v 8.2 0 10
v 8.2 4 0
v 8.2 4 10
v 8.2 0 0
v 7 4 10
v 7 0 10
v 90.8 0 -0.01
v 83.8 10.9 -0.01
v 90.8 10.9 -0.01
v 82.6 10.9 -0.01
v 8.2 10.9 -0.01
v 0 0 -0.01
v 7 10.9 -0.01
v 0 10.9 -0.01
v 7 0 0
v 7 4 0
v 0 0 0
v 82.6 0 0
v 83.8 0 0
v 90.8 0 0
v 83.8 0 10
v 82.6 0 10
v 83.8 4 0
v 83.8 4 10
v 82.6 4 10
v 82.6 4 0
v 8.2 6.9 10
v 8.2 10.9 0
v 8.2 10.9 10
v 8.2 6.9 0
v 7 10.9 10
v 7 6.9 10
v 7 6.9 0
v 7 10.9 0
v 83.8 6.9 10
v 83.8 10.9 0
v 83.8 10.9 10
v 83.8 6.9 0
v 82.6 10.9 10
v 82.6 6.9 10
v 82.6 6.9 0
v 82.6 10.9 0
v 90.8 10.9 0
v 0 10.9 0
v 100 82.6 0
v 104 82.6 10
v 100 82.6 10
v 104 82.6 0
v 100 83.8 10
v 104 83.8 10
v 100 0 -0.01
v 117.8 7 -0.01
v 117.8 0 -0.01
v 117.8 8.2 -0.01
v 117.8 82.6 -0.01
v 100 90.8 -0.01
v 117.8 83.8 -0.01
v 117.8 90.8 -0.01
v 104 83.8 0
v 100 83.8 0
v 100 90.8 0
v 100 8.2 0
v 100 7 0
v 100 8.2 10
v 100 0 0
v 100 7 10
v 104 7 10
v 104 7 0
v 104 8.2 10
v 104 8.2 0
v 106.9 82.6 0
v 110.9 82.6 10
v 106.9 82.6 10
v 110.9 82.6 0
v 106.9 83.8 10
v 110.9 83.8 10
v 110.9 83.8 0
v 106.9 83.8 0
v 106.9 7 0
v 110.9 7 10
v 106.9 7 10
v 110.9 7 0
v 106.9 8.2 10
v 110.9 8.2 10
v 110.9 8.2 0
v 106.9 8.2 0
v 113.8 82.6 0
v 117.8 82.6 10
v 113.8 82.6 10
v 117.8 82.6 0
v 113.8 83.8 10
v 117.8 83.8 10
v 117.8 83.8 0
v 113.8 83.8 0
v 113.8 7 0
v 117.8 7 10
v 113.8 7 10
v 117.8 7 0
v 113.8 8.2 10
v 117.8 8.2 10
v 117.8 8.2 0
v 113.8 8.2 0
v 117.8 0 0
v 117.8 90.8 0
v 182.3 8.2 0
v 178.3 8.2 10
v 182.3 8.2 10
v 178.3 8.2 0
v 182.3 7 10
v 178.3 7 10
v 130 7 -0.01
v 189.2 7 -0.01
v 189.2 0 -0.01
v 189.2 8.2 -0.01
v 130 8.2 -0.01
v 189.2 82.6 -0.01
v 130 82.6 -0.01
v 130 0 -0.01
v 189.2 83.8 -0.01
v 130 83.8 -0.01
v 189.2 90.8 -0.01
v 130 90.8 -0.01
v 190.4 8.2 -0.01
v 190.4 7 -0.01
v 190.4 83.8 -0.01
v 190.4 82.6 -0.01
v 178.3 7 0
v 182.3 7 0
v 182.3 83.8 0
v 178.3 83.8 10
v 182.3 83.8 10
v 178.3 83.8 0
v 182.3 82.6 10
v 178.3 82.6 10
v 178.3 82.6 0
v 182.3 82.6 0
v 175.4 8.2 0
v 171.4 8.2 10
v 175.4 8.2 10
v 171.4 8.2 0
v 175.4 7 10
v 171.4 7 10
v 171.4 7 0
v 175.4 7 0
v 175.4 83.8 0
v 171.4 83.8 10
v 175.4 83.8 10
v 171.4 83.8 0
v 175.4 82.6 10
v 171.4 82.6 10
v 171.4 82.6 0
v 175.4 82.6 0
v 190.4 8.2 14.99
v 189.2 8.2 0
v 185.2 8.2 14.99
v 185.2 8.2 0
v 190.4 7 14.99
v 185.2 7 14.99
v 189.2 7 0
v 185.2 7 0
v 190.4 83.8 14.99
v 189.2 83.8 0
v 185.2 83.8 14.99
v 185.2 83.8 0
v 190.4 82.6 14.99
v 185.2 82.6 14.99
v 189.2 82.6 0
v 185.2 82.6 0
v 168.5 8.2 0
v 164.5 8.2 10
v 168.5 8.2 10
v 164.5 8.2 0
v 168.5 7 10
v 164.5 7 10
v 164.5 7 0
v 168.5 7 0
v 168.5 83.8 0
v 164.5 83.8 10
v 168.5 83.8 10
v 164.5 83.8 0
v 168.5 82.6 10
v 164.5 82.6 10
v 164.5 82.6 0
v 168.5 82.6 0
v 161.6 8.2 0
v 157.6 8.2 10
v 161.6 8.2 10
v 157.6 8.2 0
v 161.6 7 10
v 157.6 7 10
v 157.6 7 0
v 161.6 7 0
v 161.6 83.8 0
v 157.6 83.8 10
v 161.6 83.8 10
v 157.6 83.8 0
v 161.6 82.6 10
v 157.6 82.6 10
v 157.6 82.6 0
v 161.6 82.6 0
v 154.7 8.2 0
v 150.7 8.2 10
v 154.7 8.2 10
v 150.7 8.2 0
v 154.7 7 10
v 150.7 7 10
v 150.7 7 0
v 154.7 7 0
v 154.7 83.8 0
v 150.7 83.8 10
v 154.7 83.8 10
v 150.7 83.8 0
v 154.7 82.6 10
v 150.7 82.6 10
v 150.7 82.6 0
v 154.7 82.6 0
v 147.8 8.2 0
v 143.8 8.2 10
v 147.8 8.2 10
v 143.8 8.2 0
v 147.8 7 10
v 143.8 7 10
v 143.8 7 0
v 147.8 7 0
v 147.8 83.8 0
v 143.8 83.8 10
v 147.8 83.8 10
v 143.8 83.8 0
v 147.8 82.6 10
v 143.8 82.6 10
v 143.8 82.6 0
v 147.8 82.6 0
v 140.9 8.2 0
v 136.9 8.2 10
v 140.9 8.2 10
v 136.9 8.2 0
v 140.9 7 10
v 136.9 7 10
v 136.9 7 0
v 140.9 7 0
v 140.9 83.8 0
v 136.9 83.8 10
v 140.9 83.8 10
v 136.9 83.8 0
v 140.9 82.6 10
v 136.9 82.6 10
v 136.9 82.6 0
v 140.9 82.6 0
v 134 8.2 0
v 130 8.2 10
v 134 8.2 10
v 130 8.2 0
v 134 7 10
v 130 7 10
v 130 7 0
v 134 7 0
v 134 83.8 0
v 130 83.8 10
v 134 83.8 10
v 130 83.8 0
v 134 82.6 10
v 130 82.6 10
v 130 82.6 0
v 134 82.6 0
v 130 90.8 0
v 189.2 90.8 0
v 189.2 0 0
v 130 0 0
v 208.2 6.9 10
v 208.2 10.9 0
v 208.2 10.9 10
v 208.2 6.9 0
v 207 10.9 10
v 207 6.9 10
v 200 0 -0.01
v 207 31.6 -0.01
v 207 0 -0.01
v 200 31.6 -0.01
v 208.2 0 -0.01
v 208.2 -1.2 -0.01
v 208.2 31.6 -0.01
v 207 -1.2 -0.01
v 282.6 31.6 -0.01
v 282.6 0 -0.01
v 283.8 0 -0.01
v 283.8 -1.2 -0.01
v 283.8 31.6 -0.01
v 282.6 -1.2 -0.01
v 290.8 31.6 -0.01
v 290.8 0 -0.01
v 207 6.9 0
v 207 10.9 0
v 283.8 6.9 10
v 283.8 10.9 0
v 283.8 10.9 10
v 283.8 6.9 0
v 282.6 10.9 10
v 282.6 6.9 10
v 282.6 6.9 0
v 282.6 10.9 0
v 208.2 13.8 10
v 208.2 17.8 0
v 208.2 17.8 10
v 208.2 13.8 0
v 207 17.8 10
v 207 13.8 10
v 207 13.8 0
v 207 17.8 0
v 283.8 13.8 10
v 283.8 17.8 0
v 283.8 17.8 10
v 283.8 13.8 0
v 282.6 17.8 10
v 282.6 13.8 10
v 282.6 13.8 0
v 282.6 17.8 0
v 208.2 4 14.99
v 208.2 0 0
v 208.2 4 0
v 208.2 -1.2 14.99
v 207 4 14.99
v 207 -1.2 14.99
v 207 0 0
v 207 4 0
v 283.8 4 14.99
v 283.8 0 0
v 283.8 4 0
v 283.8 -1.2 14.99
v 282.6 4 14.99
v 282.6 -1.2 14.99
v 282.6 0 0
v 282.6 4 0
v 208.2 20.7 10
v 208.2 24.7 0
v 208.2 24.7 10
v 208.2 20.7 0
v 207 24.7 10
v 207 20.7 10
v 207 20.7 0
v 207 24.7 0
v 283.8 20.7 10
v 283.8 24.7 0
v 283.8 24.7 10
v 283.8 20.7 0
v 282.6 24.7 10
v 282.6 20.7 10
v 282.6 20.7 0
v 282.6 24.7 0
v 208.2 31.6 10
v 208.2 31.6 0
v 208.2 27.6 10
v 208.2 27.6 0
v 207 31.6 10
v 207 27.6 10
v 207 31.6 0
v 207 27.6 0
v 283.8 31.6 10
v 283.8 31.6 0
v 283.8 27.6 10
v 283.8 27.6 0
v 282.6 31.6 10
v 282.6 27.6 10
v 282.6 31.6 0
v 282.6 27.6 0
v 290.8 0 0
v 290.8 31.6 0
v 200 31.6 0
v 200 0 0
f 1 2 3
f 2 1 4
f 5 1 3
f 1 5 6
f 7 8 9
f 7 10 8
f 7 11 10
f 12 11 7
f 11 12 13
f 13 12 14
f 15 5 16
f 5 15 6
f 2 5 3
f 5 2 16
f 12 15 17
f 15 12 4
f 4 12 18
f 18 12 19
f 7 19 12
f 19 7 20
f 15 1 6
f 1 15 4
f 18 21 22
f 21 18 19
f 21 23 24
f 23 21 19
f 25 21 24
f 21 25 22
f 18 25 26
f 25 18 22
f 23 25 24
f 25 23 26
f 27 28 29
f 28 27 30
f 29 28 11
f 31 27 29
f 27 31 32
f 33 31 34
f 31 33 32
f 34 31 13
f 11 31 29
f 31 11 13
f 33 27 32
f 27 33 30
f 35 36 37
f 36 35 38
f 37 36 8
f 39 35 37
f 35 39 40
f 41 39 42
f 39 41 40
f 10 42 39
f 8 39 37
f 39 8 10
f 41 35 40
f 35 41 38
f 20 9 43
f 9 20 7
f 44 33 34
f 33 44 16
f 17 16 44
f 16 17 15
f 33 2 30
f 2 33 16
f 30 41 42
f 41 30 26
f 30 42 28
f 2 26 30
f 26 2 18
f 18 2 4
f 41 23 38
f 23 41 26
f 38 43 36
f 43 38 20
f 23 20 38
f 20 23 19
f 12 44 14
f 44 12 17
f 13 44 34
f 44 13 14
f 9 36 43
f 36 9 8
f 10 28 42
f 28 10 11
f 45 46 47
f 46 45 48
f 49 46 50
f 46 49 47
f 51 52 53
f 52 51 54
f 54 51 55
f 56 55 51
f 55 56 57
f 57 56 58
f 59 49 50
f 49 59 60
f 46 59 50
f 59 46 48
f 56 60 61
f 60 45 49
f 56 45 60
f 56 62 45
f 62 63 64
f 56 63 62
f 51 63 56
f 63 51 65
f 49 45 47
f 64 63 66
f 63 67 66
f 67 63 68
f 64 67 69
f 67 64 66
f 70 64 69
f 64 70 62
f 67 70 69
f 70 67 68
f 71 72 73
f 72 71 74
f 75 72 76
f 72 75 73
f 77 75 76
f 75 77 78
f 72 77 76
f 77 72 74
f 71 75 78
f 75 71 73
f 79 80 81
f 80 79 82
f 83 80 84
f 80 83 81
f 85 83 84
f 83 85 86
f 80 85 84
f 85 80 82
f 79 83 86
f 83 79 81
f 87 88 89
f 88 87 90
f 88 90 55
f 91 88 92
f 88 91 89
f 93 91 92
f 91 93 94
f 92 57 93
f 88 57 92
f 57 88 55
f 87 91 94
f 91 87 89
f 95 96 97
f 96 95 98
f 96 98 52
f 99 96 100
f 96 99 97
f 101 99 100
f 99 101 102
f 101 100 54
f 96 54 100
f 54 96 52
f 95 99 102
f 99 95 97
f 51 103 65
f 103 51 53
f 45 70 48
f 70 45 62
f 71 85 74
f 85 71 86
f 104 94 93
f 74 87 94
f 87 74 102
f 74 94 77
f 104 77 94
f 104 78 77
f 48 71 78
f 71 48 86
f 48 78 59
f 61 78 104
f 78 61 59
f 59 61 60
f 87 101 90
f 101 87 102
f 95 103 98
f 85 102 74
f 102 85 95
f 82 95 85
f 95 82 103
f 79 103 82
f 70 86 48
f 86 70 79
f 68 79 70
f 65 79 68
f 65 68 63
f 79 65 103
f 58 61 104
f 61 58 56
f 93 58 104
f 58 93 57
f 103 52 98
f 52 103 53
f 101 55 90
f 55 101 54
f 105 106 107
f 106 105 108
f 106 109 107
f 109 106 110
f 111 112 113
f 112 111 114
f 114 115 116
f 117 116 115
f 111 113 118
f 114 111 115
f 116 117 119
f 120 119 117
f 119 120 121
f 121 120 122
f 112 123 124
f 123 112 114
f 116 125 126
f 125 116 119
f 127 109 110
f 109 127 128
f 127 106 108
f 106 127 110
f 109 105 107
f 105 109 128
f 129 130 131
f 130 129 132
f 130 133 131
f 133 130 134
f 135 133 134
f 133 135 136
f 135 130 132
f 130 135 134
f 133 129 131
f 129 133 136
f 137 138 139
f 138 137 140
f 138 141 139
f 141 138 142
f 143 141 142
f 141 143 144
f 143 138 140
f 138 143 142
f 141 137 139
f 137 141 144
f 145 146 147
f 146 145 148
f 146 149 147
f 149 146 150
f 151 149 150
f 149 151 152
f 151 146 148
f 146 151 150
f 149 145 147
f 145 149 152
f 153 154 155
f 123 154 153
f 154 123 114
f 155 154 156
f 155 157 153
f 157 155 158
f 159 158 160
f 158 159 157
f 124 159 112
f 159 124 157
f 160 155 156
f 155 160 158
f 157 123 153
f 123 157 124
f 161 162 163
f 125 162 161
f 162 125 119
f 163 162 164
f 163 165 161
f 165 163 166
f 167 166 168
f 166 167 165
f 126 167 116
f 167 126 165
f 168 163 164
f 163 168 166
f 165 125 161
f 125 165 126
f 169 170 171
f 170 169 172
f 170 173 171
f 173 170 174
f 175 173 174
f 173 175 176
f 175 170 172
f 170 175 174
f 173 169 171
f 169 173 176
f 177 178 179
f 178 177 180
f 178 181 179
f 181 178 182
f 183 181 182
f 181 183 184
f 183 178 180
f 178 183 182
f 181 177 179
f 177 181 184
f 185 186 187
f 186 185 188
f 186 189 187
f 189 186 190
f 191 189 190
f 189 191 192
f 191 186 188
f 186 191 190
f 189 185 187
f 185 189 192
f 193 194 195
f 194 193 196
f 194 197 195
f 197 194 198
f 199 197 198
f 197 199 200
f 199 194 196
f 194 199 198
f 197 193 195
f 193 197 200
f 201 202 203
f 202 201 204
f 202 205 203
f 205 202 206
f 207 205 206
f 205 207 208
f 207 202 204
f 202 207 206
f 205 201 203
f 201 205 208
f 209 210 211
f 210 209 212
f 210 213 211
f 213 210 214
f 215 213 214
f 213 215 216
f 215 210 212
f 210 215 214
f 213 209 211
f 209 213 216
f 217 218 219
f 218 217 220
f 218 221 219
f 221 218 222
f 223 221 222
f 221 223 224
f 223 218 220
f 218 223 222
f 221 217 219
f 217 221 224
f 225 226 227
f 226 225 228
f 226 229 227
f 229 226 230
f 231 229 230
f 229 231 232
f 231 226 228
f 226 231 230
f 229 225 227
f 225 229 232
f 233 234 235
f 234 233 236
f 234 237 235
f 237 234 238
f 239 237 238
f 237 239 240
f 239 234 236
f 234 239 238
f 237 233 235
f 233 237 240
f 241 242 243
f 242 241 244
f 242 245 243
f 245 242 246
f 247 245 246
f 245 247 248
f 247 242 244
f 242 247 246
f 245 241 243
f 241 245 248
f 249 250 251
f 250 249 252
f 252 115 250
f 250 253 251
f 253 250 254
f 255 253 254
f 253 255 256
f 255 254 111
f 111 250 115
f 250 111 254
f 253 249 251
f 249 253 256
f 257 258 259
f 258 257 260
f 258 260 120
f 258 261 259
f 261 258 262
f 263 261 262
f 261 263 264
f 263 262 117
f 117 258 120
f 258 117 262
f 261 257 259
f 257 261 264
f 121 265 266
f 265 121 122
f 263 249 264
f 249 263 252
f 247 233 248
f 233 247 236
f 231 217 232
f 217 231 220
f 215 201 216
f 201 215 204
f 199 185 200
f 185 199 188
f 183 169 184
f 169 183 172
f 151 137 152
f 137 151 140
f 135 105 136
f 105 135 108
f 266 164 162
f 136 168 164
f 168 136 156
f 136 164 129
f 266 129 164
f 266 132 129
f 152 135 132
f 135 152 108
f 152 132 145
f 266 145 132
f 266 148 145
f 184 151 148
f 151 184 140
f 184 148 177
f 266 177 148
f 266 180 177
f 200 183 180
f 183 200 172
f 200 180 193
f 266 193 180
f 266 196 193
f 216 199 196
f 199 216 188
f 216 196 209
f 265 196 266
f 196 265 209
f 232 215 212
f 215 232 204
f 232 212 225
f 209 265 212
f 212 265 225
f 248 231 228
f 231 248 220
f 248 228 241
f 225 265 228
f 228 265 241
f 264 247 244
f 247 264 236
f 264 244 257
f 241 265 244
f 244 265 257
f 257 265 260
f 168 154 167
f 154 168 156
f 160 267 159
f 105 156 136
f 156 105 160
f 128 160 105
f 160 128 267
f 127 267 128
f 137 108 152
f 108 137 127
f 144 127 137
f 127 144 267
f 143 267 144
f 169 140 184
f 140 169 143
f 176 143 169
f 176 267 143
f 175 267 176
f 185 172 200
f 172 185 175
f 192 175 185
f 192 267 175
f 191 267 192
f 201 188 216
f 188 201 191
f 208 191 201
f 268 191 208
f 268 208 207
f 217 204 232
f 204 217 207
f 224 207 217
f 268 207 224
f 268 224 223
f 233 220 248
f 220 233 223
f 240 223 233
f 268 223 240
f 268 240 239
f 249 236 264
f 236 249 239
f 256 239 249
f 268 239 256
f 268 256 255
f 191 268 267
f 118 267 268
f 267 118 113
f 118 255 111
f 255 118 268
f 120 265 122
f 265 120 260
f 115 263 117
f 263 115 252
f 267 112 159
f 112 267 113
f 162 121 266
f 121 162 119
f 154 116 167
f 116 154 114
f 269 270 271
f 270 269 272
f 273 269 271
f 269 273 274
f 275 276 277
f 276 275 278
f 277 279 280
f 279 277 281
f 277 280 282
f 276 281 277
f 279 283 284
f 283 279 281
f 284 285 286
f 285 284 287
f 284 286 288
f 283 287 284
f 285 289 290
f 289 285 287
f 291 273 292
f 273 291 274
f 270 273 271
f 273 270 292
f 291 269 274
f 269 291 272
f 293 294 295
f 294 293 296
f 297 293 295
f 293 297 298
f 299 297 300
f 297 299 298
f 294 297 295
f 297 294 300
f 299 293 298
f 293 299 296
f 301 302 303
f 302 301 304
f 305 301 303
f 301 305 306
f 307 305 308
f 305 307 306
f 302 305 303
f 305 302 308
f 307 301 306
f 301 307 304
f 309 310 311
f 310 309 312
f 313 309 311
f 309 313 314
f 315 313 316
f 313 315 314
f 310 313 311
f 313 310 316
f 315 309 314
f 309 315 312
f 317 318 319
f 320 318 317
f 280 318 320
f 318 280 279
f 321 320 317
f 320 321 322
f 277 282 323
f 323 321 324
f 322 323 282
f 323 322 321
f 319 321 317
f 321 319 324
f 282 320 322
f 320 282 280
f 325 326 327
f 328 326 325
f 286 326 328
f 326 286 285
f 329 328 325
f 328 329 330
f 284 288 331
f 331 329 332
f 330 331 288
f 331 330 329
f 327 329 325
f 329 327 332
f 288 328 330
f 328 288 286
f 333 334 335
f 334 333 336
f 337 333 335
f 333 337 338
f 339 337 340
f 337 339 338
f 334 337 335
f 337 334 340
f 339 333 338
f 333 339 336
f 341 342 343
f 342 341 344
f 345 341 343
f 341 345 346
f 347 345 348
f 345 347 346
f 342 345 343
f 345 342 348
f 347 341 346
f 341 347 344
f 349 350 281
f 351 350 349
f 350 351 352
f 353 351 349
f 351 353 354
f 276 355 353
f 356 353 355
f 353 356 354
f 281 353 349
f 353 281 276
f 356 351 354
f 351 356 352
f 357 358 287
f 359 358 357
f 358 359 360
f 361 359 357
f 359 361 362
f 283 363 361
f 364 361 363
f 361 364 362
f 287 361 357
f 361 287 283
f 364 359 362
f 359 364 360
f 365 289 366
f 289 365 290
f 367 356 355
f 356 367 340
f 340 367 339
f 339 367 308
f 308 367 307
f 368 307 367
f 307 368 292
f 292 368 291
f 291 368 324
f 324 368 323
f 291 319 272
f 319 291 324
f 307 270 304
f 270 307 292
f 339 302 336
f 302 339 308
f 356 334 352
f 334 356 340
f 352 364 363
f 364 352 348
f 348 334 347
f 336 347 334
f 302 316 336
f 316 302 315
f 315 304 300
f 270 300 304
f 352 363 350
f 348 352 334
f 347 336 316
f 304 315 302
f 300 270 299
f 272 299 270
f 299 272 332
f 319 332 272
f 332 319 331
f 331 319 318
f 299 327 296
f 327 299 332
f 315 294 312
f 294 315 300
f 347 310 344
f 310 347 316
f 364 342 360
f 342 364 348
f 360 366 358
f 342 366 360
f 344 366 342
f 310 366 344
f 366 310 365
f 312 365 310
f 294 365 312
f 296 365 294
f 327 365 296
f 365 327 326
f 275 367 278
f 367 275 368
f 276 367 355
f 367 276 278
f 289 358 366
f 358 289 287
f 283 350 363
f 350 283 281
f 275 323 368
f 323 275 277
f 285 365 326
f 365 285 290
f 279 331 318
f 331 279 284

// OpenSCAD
// file: ../../Base/Boxes.scad
// Fischertechnik Box Foundation
// Pre-designed Boxes

use <Constants.scad>

include <PlacementOptions.scad>

box190Width = 190;
box190Depth = 130;
box130Width = 130;
box130Depth = 95;

// Values are from an original ec3 box
topBottomDifference = 1.5;
outerHeight = 40;
innerHeight = 38.2;
baseThickness = outerHeight - innerHeight;
stackExcess = 5.7;
radius = 3.5;
wallThickness = 1.5;
tolerance = 0.2;
stackOffset = innerHeight - stackExcess;

boxUsageHeight = stackOffset;
boxWallThickness = wallThickness;
boxBaseThickness = baseThickness;
boxWebWidth = 3.0;

// getBoxWallThickness()
// Gets the wall thickness of a Fischertechnik Box
function getBoxWallThickness() = boxWallThickness;

// getBoxUsageHeight()
// Gets the usable height of a Fischertechnik box
function getBoxUsageHeight() = boxUsageHeight;

// getBoxInnerHeight()
// Gets the inner height of a Fischertechnik box, including the stack excess
function getBoxInnerHeight() = innerHeight;

// getBoxBaseThickness()
// Gets the thickness of the Fischertechnik box base.
function getBoxBaseThickness() = boxBaseThickness;

// getBoxWebWidth()
// Gets the width of a box web
function getBoxWebWidth() = boxWebWidth;

// getBox190Space()
// Gets the usable inner space of a Box 190 as an x/y-list
function getBox190Space() = [
    box190Width - 2*getBoxWallThickness() - topBottomDifference, 
    box190Depth - 2*getBoxWallThickness() - topBottomDifference ];

// BoxBase(width, depth)
// Creates an empty stackable Fischertechnik compatible box
// width = Outer width of the box (190, 130, ...)
// depth = Outer depth of the box (130, 95, ...)

module BoxBase(width, depth, height=outerHeight) {    
    thinPlate = 0.01;

    innerHeight = height - baseThickness;    
    
    module BodyPlate(width, depth) {
        translate([radius, radius])
        hull() {
            w = width-2*radius;
            d = depth-2*radius;
            cube([w, d, thinPlate]);
            cylinder(thinPlate, r=radius, $fn=getFragments());
            translate([w, 0])
                cylinder(thinPlate, r=radius, $fn=getFragments());
            translate([w, d])
                cylinder(thinPlate, r=radius, $fn=getFragments());
            translate([0, d])
                cylinder(thinPlate, r=radius, $fn=getFragments());
        }
    }
    
    module Body(tolerance=tolerance) {
        hull() {
            // Bottom with tolerance to fit into the original boxes when stacked
            translate([-wallThickness+tolerance, -wallThickness+tolerance, -baseThickness])
                BodyPlate(width-topBottomDifference-2*tolerance, depth-topBottomDifference-2*tolerance);
            
            // Top
            translate([-wallThickness-topBottomDifference/2, -wallThickness-topBottomDifference/2, innerHeight-thinPlate])
                BodyPlate(width, depth);
         }
    }

    module Cutoff() {
        hull() {
            coWidth = width - 2*wallThickness;
            coDepth = depth - 2*wallThickness;
            
            // Bottom
            BodyPlate(coWidth-topBottomDifference, coDepth-topBottomDifference);

            // Top
            translate([-topBottomDifference/2, -topBottomDifference/2, innerHeight+thinPlate]) 
                BodyPlate(coWidth, coDepth);
        }
    }
    
    difference() {        
        Body();
        Cutoff();
        stackOffset = innerHeight - stackExcess;
        translate([0, 0, stackOffset + baseThickness])
            Body(tolerance=0);
    }
}

// Creates the Fischertechnik empty box 130x190 mm and places it at position 0,0
// 190x130 are the outer sizes, the inner space is slightly smaller. Use getBox190Space() to get the inner sizes.
// The box is positioned that the usable inner space is at the 0,0,0 position. The

module Box190() {
    BoxBase(box190Width, box190Depth);
}

// Gets the usable inner space of a Box 130 as an x/y-list
function getBox130Space() = [
    box130Width - 2*getBoxWallThickness(), 
    box130Depth - 2*getBoxWallThickness() ];

// Creates the Fischertechnik empty box 95x130 mm and places it at position 0,0
// 190x130 are the outer sizes, the inner space is slightly smaller. Use getBox190Space() to get the inner sizes.
// The box is positioned that the usable inner space is at the 0,0,0 position. The

module Box130() {
    BoxBase(box130Width, box130Depth);
}

// Creates a web at the specified box walls
// corner 0 = LowerLeft, 1 = UpperLeft, 2 = UpperRight, 3 = LowerRight
// side 0 = LeftOfCorner, 1 = RightOfCorner
// distance = Distance in mm from the corner
// boxSpace = inner width and depth of the box (default: Box 190)
// webWidth = length of the web (default is 3 mms)
// webThickness = thickness of the web (default is 1 mm)

module BoxWeb(corner, side, distance, boxSpace=getBox190Space(), webWidth=getBoxWebWidth(), webThickness=1.0) {
    sink = getBoxWallThickness()/2;

    width = (corner % 2 == 0) ? 
            (side == LeftOfCorner ? webWidth : webThickness) :
            (side == LeftOfCorner ? webThickness : webWidth);

    depth = (corner % 2 == 0) ? 
            (side == RightOfCorner ? webWidth : webThickness) :
            (side == RightOfCorner ? webThickness : webWidth);
    
    xDiff = corner == LowerLeft ? 
                (side == LeftOfCorner ? -sink : distance) :
            (corner == UpperLeft ?                
                (side == LeftOfCorner ? distance : -sink) :
            (corner == UpperRight ?
                (side == LeftOfCorner ? boxSpace.x-webWidth+sink : boxSpace.x-distance-webThickness) :
                (side == LeftOfCorner ? boxSpace.x-distance-webThickness: boxSpace.x-webWidth+sink)));

    yDiff = corner == LowerLeft ? 
                (side == RightOfCorner ? -sink : distance) :
            (corner == UpperLeft ?
                (side == RightOfCorner ? boxSpace.y-distance : boxSpace.y-webWidth+sink) :
            (corner == UpperRight ?
                (side == RightOfCorner ? boxSpace.y-webWidth+sink : boxSpace.y-distance) :
                (side == RightOfCorner ? distance : -sink)));
    
    translate([xDiff, yDiff, -getExcess()])
        cube([width, depth, boxUsageHeight + 2*getExcess()]);
}
// file: ../../Base/Rotation.scad
// Fischertechnik Box Foundation
// Geometry Helpers Rotation

include <PlacementOptions.scad>

// getRotatedSpace(space, rotation=NoRotation)
// Rotates the space dependent on the specified rotation

function getRotatedSpace(space, rotation=NoRotation) = [
    (rotation == Rotate90 || rotation == Rotate270) ? space.y : space.x,
    (rotation == Rotate90 || rotation == Rotate270) ? space.x : space.y
];

// Rotates the given space around the fixed left lower corner
// space = the space the children needs as width/depth list [width,depth]
// rotation = 0 Rotate0 degrees, 1 Rotate90 degrees, 2 Rotate180 degrees, 3 Rotate270 degrees (equivalent to -90)

module RotateFix(space, rotation=NoRotation) {
    dy = (rotation == Rotate0 || rotation == Rotate270) ? 0 :
        (rotation == Rotate90) ? space.x :
        space.y;
    dx = (rotation < Rotate180) ? 0 :
        (rotation == Rotate180) ? space.x :
        space.y;
    
    translate([dx, dy, 0])
        rotate([0, 0, rotations[rotation]])
            children();
}
// file: ../../Base/Alignment.scad
// Fischertechnik Box Foundation
// Geometry Helpers Alignment

include <PlacementOptions.scad>

// getAlignedX(elementWidth, spaceWidth, align=AlignRight, offset=0)
// Gets the aligned X offset of an element with the given
// width in the given space.
// elementWidth = The width of the element to positon
// spaceWidth = The space where the element should be aligned
// align = 0 AlignLeft, 1 AlignCenter, 2 AlignRight
// offset = an optional offset from the aligned position. When
// aligned left or centered, then positive values are in X direction.
// When aligned right then positive values are in negative X direction.

function getAlignedX(elementWidth, spaceWidth, align=AlignRight, offset=0) =
    (align == AlignLeft) ?
        offset :
        ((align == AlignCenter) ?
        (spaceWidth - elementWidth)/2 + offset :
        spaceWidth - offset - elementWidth);

// getAlignedY(elementDepth, spaceDepth, align=AlignTop, offset=0)
// Gets the aligned Y offset of an element with the given
// depth in the given space.
// elementDepth = The depth of the element to positon
// spaceDepth = The space where the element should be aligned
// align = 0 AlignBottom, 1 AlignCenter, 2 AlignTop
// offset = an optional offset from the aligned position. When
// aligned bottom or centered, then positive values are in Y direction.
// When aligned top then positive values are in negative Y direction.

function getAlignedY(elementDepth, spaceDepth, align=AlignTop, offset=0) =
    (align == AlignBottom) ?
        offset :
        ((align == AlignCenter) ?
        (spaceDepth - elementDepth)/2 + offset :
        spaceDepth - offset - elementDepth);
// file: ../../Base/Constants.scad
// Fischertechnik Box Foundation
// Constants

// Constant values necessary for multiple elements

// Base constants
dividerThickness = 1.2;
excess = 0.01;
fragments = 90;
tolerance = 0.8;

// Gets the thickness of a divider 
function getDividerThickness() = dividerThickness;

// Gets the excess that is used to merge walls into each other
function getExcess() = excess;

// Gets amount of fragments of a cylinder
function getFragments() = fragments;

// Gets the inner tolerance of a frame to each side
function getTolerance() = tolerance;


// Fischertechnik specific constants
axisDiameter = 4;
axisBottomDiameter = axisDiameter + 1;
standardEdgeDistance = 2.5;
standardWebDistance = 11.5;
standardCornerLength = 15;
tubeWallFactor = 0.8;
smallPartsFrameHeight = 20;

// Gets axis diameter
function getAxisDiameter() = axisDiameter;

// Gets axis bottom diameter for thicker part at the bottom
function getAxisBottomDiameter() = axisBottomDiameter;

// gets the standard distance to the wall of the box for dockable frames with webs
function getStandardEdgeDistance() = standardEdgeDistance;

// gets the standard distance of each web to the corner of the dockable frame
function getStandardWebDistance() = standardWebDistance;

// gets the standard length of the corner walls of a dockable frame
function getStandardCornerLength() = standardCornerLength;

// gets the wall thickness of a tube.
function getTubeWallThickness() = tubeWallFactor * getDividerThickness();

// gets the frame height for docked small parts boxes.
function getSmallPartsFrameHeight() = smallPartsFrameHeight;
// file: ../../Base/PlacementOptions.scad
// Fischertechnik Box Foundation
// Placement Options

// Alignment
NoAlign = 0;
AlignLeft = 1;
AlignBottom = 2;
AlignCenter = 3;
AlignRight = 4;
AlignTop = 5;

// Element rotation degree steps
rotations = [0, -90, -180, -270];

// Rotation
NoRotation = 0;
Rotate0 = 0;
Rotate90 = 1;
Rotate180 = 2;
Rotate270 = 3;

// Docking (seen from above)
NoDock = -1;
DockLeft = 0;
DockTop = 1;
DockRight = 2;
DockCorner = 2;
DockBottom = 3;

// Web corners
LowerLeft = 0;
UpperLeft = 1;
UpperRight = 2;
LowerRight = 3;

// Web position relative to corner
LeftOfCorner = 0;
RightOfCorner = 1;
// file: ../../Elements/HolderBuildingPlate30x90.scad
// Fischertechnik Box Library
// Holder for Building Plate 30x90
// 38251

use <../ModelBase/Complex.scad>

width = 90;

// getHolderBuildingPlateSpace30x90(count = 1)
// Gets the width (.x) and depth (.y) space the holder needs.

function getHolderBuildingPlate30x90Space(count = 1) = getHolderBuildingPlateSpace(width, count);

// HolderBuildingPlate30x90(count=1, dock=false)
// Holder for building plates 30x90
// count = Count of building plates (default 1)
// dock = true if the holders are docked to the box wall (default false) 

module HolderBuildingPlate30x90(count = 1, dock = false) {
    HolderBuildingPlate(width, count, dock);
}

// Test
color("lightgray")
HolderBuildingPlate30x90();
// file: ../../Base/Placement.scad
// Fischertechnik Box Foundation
// Geometry Helpers Placement

use <Constants.scad>
use <Alignment.scad>
use <Rotation.scad>
use <Boxes.scad>

include <PlacementOptions.scad>

// Place(x=0, y=0, elementSpace=[0,0], alignX=AlignLeft, alignY=AlignBottom, rotation=Rotate0, boxSpace=getBox190Space())
// Places the child at the specified position
// y = Y-Position. This is a relative position when an X aligment is specified.
// x = X-Position. This is a relative position when an Y aligment is specified.
// elementSpace = space of the element to be placed [x,y]
// alignX = -1=NoAlign, 0 AlignLeft, 1 AlignCenter, 3 AlignRight (elementSpace and boxSpace required!)
// alignY = -1=NoAlign, 2 AlignBottom, 1 AlignCenter, 4 AlignTop (elementSpace and boxSpace required!)
// rotation = 0 Rotate0 0 degrees, 1 Rotate90 90 degrees, 
// 2 Rotate180 180 degrees, 3 Rotate270 270 degrees (equivalent to -90)
// boxSpace = Inner space of the box where the placement occurs [x,y] - default is Box 190x130 inner space

module Place(x=0, y=0, elementSpace=[0,0], 
  alignX=AlignLeft, alignY=AlignBottom, 
  rotation=NoRotation, boxSpace=getBox190Space()) {

    module Position(x, y, space, rotation=Rotate0) {
        translate([x, y, 0])
            RotateFix(space, rotation)
                children();
    }

    space = getRotatedSpace(elementSpace, rotation);
    alignedX = getAlignedX(space.x, boxSpace.x, alignX, x);
    alignedY = getAlignedY(space.y, boxSpace.y, alignY, y);
    Position(alignedX, alignedY, elementSpace, rotation)
        children();
}

// Center(space=getBox130Space(), elementSpace=[0,0])
// space = Space where the children is centered. For cylinder use centered=true and no elementSpace.
// elementSpace = space of the element to be centered [x,y]

module Center(space=getBox190Space(), elementSpace=[0,0]) {
    Place(elementSpace=elementSpace, boxSpace=space, alignX=AlignCenter, alignY=AlignCenter)
        children();
}

// CenterHorizontal(width=0, y=0, offset=0, space=getBox130Space())
// width = Width of the element to be placed.
// y = Y position of the element
// offset = Offset from the center position (negative will be left of the center)
// space = Space where the element is placed

module CenterHorizontal(width=0, y=0, offset=0, space=getBox190Space()) {
    Place(x=offset, y=y, elementSpace=[width, 0], boxSpace=space, alignX=AlignCenter)
        children(0);
}

// CenterVertical(depth=0, x=0, offset=0, space=getBox130Space())
// depth = Depth of the element to be placed.
// x = X position of the element
// offset = Offset from the center position (negative will be down of the center)
// space = Space where the element is placed

module CenterVertical(depth=0, x=0, offset=0, space=getBox190Space()) {
    Place(x=x, y=offset, elementSpace=[0, depth], boxSpace=space, alignY=AlignCenter)
        children(0);
}

// getIsVertical(align)
// True if the specified alignment needs a vertical orientation for a divider (AlignRight, AlignLeft)

function getIsVertical(align) = (align == AlignRight || align == AlignLeft);

// getIsHorizontal(align)
// True if the specified alignment needs a horizontal orientation for a divider (AlignTop, AlignBottom)

function getIsHorizontal(align) = (align == AlignTop || align == AlignBottom);
// main file
// Fischertechnik Box Foundation
// Elements
// Test HolderBuildingPlate30x90

use <../../Base/Placement.scad>
use <../../Elements/HolderBuildingPlate30x90.scad>

include <../../Base/PlacementOptions.scad>

HolderBuildingPlate30x90();

Place(100, 0, elementSpace=getHolderBuildingPlate30x90Space(2), rotation=Rotate90)
    HolderBuildingPlate30x90(2);

Place(130, 0, elementSpace=getHolderBuildingPlate30x90Space(8), rotation=Rotate270)
    HolderBuildingPlate30x90(8, true);

Place(200, 0)
    HolderBuildingPlate30x90(4, true);
